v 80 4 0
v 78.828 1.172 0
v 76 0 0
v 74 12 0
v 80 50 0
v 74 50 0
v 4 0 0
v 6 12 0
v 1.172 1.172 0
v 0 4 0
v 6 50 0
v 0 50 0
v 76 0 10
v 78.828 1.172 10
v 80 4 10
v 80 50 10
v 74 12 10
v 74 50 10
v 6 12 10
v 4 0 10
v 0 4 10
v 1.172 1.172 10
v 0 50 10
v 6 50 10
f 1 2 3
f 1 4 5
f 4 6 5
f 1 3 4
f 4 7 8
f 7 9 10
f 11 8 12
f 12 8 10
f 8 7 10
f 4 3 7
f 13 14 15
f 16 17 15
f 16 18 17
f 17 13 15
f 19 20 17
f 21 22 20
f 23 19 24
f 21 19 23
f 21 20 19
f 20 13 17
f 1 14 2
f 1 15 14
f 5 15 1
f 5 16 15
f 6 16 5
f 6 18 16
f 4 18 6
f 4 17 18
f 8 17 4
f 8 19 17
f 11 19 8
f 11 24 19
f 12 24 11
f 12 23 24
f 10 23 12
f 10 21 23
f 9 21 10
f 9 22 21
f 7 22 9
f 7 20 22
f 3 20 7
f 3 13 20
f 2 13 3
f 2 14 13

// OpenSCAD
$fn = 32;

// ----------------------------------------------------------------------
// Heat sink frame: 80 x 50 mm frame, 6 mm walls
// ----------------------------------------------------------------------

// --- parameters (mm) ---
profile_height = 10;      // extrusion height
profile_points = 12;      // points of the closed outline

profile = [[0, 4], [1.172, 1.172], [4, 0], [76, 0], [78.828, 1.172], [80, 4], [80, 50], [74, 50], [74, 12], [6, 12], [6, 50], [0, 50]];  // single closed polygon, 12 points, counter clockwise

// --- the one profile operation ---
linear_extrude(height = profile_height) polygon(points = profile);
